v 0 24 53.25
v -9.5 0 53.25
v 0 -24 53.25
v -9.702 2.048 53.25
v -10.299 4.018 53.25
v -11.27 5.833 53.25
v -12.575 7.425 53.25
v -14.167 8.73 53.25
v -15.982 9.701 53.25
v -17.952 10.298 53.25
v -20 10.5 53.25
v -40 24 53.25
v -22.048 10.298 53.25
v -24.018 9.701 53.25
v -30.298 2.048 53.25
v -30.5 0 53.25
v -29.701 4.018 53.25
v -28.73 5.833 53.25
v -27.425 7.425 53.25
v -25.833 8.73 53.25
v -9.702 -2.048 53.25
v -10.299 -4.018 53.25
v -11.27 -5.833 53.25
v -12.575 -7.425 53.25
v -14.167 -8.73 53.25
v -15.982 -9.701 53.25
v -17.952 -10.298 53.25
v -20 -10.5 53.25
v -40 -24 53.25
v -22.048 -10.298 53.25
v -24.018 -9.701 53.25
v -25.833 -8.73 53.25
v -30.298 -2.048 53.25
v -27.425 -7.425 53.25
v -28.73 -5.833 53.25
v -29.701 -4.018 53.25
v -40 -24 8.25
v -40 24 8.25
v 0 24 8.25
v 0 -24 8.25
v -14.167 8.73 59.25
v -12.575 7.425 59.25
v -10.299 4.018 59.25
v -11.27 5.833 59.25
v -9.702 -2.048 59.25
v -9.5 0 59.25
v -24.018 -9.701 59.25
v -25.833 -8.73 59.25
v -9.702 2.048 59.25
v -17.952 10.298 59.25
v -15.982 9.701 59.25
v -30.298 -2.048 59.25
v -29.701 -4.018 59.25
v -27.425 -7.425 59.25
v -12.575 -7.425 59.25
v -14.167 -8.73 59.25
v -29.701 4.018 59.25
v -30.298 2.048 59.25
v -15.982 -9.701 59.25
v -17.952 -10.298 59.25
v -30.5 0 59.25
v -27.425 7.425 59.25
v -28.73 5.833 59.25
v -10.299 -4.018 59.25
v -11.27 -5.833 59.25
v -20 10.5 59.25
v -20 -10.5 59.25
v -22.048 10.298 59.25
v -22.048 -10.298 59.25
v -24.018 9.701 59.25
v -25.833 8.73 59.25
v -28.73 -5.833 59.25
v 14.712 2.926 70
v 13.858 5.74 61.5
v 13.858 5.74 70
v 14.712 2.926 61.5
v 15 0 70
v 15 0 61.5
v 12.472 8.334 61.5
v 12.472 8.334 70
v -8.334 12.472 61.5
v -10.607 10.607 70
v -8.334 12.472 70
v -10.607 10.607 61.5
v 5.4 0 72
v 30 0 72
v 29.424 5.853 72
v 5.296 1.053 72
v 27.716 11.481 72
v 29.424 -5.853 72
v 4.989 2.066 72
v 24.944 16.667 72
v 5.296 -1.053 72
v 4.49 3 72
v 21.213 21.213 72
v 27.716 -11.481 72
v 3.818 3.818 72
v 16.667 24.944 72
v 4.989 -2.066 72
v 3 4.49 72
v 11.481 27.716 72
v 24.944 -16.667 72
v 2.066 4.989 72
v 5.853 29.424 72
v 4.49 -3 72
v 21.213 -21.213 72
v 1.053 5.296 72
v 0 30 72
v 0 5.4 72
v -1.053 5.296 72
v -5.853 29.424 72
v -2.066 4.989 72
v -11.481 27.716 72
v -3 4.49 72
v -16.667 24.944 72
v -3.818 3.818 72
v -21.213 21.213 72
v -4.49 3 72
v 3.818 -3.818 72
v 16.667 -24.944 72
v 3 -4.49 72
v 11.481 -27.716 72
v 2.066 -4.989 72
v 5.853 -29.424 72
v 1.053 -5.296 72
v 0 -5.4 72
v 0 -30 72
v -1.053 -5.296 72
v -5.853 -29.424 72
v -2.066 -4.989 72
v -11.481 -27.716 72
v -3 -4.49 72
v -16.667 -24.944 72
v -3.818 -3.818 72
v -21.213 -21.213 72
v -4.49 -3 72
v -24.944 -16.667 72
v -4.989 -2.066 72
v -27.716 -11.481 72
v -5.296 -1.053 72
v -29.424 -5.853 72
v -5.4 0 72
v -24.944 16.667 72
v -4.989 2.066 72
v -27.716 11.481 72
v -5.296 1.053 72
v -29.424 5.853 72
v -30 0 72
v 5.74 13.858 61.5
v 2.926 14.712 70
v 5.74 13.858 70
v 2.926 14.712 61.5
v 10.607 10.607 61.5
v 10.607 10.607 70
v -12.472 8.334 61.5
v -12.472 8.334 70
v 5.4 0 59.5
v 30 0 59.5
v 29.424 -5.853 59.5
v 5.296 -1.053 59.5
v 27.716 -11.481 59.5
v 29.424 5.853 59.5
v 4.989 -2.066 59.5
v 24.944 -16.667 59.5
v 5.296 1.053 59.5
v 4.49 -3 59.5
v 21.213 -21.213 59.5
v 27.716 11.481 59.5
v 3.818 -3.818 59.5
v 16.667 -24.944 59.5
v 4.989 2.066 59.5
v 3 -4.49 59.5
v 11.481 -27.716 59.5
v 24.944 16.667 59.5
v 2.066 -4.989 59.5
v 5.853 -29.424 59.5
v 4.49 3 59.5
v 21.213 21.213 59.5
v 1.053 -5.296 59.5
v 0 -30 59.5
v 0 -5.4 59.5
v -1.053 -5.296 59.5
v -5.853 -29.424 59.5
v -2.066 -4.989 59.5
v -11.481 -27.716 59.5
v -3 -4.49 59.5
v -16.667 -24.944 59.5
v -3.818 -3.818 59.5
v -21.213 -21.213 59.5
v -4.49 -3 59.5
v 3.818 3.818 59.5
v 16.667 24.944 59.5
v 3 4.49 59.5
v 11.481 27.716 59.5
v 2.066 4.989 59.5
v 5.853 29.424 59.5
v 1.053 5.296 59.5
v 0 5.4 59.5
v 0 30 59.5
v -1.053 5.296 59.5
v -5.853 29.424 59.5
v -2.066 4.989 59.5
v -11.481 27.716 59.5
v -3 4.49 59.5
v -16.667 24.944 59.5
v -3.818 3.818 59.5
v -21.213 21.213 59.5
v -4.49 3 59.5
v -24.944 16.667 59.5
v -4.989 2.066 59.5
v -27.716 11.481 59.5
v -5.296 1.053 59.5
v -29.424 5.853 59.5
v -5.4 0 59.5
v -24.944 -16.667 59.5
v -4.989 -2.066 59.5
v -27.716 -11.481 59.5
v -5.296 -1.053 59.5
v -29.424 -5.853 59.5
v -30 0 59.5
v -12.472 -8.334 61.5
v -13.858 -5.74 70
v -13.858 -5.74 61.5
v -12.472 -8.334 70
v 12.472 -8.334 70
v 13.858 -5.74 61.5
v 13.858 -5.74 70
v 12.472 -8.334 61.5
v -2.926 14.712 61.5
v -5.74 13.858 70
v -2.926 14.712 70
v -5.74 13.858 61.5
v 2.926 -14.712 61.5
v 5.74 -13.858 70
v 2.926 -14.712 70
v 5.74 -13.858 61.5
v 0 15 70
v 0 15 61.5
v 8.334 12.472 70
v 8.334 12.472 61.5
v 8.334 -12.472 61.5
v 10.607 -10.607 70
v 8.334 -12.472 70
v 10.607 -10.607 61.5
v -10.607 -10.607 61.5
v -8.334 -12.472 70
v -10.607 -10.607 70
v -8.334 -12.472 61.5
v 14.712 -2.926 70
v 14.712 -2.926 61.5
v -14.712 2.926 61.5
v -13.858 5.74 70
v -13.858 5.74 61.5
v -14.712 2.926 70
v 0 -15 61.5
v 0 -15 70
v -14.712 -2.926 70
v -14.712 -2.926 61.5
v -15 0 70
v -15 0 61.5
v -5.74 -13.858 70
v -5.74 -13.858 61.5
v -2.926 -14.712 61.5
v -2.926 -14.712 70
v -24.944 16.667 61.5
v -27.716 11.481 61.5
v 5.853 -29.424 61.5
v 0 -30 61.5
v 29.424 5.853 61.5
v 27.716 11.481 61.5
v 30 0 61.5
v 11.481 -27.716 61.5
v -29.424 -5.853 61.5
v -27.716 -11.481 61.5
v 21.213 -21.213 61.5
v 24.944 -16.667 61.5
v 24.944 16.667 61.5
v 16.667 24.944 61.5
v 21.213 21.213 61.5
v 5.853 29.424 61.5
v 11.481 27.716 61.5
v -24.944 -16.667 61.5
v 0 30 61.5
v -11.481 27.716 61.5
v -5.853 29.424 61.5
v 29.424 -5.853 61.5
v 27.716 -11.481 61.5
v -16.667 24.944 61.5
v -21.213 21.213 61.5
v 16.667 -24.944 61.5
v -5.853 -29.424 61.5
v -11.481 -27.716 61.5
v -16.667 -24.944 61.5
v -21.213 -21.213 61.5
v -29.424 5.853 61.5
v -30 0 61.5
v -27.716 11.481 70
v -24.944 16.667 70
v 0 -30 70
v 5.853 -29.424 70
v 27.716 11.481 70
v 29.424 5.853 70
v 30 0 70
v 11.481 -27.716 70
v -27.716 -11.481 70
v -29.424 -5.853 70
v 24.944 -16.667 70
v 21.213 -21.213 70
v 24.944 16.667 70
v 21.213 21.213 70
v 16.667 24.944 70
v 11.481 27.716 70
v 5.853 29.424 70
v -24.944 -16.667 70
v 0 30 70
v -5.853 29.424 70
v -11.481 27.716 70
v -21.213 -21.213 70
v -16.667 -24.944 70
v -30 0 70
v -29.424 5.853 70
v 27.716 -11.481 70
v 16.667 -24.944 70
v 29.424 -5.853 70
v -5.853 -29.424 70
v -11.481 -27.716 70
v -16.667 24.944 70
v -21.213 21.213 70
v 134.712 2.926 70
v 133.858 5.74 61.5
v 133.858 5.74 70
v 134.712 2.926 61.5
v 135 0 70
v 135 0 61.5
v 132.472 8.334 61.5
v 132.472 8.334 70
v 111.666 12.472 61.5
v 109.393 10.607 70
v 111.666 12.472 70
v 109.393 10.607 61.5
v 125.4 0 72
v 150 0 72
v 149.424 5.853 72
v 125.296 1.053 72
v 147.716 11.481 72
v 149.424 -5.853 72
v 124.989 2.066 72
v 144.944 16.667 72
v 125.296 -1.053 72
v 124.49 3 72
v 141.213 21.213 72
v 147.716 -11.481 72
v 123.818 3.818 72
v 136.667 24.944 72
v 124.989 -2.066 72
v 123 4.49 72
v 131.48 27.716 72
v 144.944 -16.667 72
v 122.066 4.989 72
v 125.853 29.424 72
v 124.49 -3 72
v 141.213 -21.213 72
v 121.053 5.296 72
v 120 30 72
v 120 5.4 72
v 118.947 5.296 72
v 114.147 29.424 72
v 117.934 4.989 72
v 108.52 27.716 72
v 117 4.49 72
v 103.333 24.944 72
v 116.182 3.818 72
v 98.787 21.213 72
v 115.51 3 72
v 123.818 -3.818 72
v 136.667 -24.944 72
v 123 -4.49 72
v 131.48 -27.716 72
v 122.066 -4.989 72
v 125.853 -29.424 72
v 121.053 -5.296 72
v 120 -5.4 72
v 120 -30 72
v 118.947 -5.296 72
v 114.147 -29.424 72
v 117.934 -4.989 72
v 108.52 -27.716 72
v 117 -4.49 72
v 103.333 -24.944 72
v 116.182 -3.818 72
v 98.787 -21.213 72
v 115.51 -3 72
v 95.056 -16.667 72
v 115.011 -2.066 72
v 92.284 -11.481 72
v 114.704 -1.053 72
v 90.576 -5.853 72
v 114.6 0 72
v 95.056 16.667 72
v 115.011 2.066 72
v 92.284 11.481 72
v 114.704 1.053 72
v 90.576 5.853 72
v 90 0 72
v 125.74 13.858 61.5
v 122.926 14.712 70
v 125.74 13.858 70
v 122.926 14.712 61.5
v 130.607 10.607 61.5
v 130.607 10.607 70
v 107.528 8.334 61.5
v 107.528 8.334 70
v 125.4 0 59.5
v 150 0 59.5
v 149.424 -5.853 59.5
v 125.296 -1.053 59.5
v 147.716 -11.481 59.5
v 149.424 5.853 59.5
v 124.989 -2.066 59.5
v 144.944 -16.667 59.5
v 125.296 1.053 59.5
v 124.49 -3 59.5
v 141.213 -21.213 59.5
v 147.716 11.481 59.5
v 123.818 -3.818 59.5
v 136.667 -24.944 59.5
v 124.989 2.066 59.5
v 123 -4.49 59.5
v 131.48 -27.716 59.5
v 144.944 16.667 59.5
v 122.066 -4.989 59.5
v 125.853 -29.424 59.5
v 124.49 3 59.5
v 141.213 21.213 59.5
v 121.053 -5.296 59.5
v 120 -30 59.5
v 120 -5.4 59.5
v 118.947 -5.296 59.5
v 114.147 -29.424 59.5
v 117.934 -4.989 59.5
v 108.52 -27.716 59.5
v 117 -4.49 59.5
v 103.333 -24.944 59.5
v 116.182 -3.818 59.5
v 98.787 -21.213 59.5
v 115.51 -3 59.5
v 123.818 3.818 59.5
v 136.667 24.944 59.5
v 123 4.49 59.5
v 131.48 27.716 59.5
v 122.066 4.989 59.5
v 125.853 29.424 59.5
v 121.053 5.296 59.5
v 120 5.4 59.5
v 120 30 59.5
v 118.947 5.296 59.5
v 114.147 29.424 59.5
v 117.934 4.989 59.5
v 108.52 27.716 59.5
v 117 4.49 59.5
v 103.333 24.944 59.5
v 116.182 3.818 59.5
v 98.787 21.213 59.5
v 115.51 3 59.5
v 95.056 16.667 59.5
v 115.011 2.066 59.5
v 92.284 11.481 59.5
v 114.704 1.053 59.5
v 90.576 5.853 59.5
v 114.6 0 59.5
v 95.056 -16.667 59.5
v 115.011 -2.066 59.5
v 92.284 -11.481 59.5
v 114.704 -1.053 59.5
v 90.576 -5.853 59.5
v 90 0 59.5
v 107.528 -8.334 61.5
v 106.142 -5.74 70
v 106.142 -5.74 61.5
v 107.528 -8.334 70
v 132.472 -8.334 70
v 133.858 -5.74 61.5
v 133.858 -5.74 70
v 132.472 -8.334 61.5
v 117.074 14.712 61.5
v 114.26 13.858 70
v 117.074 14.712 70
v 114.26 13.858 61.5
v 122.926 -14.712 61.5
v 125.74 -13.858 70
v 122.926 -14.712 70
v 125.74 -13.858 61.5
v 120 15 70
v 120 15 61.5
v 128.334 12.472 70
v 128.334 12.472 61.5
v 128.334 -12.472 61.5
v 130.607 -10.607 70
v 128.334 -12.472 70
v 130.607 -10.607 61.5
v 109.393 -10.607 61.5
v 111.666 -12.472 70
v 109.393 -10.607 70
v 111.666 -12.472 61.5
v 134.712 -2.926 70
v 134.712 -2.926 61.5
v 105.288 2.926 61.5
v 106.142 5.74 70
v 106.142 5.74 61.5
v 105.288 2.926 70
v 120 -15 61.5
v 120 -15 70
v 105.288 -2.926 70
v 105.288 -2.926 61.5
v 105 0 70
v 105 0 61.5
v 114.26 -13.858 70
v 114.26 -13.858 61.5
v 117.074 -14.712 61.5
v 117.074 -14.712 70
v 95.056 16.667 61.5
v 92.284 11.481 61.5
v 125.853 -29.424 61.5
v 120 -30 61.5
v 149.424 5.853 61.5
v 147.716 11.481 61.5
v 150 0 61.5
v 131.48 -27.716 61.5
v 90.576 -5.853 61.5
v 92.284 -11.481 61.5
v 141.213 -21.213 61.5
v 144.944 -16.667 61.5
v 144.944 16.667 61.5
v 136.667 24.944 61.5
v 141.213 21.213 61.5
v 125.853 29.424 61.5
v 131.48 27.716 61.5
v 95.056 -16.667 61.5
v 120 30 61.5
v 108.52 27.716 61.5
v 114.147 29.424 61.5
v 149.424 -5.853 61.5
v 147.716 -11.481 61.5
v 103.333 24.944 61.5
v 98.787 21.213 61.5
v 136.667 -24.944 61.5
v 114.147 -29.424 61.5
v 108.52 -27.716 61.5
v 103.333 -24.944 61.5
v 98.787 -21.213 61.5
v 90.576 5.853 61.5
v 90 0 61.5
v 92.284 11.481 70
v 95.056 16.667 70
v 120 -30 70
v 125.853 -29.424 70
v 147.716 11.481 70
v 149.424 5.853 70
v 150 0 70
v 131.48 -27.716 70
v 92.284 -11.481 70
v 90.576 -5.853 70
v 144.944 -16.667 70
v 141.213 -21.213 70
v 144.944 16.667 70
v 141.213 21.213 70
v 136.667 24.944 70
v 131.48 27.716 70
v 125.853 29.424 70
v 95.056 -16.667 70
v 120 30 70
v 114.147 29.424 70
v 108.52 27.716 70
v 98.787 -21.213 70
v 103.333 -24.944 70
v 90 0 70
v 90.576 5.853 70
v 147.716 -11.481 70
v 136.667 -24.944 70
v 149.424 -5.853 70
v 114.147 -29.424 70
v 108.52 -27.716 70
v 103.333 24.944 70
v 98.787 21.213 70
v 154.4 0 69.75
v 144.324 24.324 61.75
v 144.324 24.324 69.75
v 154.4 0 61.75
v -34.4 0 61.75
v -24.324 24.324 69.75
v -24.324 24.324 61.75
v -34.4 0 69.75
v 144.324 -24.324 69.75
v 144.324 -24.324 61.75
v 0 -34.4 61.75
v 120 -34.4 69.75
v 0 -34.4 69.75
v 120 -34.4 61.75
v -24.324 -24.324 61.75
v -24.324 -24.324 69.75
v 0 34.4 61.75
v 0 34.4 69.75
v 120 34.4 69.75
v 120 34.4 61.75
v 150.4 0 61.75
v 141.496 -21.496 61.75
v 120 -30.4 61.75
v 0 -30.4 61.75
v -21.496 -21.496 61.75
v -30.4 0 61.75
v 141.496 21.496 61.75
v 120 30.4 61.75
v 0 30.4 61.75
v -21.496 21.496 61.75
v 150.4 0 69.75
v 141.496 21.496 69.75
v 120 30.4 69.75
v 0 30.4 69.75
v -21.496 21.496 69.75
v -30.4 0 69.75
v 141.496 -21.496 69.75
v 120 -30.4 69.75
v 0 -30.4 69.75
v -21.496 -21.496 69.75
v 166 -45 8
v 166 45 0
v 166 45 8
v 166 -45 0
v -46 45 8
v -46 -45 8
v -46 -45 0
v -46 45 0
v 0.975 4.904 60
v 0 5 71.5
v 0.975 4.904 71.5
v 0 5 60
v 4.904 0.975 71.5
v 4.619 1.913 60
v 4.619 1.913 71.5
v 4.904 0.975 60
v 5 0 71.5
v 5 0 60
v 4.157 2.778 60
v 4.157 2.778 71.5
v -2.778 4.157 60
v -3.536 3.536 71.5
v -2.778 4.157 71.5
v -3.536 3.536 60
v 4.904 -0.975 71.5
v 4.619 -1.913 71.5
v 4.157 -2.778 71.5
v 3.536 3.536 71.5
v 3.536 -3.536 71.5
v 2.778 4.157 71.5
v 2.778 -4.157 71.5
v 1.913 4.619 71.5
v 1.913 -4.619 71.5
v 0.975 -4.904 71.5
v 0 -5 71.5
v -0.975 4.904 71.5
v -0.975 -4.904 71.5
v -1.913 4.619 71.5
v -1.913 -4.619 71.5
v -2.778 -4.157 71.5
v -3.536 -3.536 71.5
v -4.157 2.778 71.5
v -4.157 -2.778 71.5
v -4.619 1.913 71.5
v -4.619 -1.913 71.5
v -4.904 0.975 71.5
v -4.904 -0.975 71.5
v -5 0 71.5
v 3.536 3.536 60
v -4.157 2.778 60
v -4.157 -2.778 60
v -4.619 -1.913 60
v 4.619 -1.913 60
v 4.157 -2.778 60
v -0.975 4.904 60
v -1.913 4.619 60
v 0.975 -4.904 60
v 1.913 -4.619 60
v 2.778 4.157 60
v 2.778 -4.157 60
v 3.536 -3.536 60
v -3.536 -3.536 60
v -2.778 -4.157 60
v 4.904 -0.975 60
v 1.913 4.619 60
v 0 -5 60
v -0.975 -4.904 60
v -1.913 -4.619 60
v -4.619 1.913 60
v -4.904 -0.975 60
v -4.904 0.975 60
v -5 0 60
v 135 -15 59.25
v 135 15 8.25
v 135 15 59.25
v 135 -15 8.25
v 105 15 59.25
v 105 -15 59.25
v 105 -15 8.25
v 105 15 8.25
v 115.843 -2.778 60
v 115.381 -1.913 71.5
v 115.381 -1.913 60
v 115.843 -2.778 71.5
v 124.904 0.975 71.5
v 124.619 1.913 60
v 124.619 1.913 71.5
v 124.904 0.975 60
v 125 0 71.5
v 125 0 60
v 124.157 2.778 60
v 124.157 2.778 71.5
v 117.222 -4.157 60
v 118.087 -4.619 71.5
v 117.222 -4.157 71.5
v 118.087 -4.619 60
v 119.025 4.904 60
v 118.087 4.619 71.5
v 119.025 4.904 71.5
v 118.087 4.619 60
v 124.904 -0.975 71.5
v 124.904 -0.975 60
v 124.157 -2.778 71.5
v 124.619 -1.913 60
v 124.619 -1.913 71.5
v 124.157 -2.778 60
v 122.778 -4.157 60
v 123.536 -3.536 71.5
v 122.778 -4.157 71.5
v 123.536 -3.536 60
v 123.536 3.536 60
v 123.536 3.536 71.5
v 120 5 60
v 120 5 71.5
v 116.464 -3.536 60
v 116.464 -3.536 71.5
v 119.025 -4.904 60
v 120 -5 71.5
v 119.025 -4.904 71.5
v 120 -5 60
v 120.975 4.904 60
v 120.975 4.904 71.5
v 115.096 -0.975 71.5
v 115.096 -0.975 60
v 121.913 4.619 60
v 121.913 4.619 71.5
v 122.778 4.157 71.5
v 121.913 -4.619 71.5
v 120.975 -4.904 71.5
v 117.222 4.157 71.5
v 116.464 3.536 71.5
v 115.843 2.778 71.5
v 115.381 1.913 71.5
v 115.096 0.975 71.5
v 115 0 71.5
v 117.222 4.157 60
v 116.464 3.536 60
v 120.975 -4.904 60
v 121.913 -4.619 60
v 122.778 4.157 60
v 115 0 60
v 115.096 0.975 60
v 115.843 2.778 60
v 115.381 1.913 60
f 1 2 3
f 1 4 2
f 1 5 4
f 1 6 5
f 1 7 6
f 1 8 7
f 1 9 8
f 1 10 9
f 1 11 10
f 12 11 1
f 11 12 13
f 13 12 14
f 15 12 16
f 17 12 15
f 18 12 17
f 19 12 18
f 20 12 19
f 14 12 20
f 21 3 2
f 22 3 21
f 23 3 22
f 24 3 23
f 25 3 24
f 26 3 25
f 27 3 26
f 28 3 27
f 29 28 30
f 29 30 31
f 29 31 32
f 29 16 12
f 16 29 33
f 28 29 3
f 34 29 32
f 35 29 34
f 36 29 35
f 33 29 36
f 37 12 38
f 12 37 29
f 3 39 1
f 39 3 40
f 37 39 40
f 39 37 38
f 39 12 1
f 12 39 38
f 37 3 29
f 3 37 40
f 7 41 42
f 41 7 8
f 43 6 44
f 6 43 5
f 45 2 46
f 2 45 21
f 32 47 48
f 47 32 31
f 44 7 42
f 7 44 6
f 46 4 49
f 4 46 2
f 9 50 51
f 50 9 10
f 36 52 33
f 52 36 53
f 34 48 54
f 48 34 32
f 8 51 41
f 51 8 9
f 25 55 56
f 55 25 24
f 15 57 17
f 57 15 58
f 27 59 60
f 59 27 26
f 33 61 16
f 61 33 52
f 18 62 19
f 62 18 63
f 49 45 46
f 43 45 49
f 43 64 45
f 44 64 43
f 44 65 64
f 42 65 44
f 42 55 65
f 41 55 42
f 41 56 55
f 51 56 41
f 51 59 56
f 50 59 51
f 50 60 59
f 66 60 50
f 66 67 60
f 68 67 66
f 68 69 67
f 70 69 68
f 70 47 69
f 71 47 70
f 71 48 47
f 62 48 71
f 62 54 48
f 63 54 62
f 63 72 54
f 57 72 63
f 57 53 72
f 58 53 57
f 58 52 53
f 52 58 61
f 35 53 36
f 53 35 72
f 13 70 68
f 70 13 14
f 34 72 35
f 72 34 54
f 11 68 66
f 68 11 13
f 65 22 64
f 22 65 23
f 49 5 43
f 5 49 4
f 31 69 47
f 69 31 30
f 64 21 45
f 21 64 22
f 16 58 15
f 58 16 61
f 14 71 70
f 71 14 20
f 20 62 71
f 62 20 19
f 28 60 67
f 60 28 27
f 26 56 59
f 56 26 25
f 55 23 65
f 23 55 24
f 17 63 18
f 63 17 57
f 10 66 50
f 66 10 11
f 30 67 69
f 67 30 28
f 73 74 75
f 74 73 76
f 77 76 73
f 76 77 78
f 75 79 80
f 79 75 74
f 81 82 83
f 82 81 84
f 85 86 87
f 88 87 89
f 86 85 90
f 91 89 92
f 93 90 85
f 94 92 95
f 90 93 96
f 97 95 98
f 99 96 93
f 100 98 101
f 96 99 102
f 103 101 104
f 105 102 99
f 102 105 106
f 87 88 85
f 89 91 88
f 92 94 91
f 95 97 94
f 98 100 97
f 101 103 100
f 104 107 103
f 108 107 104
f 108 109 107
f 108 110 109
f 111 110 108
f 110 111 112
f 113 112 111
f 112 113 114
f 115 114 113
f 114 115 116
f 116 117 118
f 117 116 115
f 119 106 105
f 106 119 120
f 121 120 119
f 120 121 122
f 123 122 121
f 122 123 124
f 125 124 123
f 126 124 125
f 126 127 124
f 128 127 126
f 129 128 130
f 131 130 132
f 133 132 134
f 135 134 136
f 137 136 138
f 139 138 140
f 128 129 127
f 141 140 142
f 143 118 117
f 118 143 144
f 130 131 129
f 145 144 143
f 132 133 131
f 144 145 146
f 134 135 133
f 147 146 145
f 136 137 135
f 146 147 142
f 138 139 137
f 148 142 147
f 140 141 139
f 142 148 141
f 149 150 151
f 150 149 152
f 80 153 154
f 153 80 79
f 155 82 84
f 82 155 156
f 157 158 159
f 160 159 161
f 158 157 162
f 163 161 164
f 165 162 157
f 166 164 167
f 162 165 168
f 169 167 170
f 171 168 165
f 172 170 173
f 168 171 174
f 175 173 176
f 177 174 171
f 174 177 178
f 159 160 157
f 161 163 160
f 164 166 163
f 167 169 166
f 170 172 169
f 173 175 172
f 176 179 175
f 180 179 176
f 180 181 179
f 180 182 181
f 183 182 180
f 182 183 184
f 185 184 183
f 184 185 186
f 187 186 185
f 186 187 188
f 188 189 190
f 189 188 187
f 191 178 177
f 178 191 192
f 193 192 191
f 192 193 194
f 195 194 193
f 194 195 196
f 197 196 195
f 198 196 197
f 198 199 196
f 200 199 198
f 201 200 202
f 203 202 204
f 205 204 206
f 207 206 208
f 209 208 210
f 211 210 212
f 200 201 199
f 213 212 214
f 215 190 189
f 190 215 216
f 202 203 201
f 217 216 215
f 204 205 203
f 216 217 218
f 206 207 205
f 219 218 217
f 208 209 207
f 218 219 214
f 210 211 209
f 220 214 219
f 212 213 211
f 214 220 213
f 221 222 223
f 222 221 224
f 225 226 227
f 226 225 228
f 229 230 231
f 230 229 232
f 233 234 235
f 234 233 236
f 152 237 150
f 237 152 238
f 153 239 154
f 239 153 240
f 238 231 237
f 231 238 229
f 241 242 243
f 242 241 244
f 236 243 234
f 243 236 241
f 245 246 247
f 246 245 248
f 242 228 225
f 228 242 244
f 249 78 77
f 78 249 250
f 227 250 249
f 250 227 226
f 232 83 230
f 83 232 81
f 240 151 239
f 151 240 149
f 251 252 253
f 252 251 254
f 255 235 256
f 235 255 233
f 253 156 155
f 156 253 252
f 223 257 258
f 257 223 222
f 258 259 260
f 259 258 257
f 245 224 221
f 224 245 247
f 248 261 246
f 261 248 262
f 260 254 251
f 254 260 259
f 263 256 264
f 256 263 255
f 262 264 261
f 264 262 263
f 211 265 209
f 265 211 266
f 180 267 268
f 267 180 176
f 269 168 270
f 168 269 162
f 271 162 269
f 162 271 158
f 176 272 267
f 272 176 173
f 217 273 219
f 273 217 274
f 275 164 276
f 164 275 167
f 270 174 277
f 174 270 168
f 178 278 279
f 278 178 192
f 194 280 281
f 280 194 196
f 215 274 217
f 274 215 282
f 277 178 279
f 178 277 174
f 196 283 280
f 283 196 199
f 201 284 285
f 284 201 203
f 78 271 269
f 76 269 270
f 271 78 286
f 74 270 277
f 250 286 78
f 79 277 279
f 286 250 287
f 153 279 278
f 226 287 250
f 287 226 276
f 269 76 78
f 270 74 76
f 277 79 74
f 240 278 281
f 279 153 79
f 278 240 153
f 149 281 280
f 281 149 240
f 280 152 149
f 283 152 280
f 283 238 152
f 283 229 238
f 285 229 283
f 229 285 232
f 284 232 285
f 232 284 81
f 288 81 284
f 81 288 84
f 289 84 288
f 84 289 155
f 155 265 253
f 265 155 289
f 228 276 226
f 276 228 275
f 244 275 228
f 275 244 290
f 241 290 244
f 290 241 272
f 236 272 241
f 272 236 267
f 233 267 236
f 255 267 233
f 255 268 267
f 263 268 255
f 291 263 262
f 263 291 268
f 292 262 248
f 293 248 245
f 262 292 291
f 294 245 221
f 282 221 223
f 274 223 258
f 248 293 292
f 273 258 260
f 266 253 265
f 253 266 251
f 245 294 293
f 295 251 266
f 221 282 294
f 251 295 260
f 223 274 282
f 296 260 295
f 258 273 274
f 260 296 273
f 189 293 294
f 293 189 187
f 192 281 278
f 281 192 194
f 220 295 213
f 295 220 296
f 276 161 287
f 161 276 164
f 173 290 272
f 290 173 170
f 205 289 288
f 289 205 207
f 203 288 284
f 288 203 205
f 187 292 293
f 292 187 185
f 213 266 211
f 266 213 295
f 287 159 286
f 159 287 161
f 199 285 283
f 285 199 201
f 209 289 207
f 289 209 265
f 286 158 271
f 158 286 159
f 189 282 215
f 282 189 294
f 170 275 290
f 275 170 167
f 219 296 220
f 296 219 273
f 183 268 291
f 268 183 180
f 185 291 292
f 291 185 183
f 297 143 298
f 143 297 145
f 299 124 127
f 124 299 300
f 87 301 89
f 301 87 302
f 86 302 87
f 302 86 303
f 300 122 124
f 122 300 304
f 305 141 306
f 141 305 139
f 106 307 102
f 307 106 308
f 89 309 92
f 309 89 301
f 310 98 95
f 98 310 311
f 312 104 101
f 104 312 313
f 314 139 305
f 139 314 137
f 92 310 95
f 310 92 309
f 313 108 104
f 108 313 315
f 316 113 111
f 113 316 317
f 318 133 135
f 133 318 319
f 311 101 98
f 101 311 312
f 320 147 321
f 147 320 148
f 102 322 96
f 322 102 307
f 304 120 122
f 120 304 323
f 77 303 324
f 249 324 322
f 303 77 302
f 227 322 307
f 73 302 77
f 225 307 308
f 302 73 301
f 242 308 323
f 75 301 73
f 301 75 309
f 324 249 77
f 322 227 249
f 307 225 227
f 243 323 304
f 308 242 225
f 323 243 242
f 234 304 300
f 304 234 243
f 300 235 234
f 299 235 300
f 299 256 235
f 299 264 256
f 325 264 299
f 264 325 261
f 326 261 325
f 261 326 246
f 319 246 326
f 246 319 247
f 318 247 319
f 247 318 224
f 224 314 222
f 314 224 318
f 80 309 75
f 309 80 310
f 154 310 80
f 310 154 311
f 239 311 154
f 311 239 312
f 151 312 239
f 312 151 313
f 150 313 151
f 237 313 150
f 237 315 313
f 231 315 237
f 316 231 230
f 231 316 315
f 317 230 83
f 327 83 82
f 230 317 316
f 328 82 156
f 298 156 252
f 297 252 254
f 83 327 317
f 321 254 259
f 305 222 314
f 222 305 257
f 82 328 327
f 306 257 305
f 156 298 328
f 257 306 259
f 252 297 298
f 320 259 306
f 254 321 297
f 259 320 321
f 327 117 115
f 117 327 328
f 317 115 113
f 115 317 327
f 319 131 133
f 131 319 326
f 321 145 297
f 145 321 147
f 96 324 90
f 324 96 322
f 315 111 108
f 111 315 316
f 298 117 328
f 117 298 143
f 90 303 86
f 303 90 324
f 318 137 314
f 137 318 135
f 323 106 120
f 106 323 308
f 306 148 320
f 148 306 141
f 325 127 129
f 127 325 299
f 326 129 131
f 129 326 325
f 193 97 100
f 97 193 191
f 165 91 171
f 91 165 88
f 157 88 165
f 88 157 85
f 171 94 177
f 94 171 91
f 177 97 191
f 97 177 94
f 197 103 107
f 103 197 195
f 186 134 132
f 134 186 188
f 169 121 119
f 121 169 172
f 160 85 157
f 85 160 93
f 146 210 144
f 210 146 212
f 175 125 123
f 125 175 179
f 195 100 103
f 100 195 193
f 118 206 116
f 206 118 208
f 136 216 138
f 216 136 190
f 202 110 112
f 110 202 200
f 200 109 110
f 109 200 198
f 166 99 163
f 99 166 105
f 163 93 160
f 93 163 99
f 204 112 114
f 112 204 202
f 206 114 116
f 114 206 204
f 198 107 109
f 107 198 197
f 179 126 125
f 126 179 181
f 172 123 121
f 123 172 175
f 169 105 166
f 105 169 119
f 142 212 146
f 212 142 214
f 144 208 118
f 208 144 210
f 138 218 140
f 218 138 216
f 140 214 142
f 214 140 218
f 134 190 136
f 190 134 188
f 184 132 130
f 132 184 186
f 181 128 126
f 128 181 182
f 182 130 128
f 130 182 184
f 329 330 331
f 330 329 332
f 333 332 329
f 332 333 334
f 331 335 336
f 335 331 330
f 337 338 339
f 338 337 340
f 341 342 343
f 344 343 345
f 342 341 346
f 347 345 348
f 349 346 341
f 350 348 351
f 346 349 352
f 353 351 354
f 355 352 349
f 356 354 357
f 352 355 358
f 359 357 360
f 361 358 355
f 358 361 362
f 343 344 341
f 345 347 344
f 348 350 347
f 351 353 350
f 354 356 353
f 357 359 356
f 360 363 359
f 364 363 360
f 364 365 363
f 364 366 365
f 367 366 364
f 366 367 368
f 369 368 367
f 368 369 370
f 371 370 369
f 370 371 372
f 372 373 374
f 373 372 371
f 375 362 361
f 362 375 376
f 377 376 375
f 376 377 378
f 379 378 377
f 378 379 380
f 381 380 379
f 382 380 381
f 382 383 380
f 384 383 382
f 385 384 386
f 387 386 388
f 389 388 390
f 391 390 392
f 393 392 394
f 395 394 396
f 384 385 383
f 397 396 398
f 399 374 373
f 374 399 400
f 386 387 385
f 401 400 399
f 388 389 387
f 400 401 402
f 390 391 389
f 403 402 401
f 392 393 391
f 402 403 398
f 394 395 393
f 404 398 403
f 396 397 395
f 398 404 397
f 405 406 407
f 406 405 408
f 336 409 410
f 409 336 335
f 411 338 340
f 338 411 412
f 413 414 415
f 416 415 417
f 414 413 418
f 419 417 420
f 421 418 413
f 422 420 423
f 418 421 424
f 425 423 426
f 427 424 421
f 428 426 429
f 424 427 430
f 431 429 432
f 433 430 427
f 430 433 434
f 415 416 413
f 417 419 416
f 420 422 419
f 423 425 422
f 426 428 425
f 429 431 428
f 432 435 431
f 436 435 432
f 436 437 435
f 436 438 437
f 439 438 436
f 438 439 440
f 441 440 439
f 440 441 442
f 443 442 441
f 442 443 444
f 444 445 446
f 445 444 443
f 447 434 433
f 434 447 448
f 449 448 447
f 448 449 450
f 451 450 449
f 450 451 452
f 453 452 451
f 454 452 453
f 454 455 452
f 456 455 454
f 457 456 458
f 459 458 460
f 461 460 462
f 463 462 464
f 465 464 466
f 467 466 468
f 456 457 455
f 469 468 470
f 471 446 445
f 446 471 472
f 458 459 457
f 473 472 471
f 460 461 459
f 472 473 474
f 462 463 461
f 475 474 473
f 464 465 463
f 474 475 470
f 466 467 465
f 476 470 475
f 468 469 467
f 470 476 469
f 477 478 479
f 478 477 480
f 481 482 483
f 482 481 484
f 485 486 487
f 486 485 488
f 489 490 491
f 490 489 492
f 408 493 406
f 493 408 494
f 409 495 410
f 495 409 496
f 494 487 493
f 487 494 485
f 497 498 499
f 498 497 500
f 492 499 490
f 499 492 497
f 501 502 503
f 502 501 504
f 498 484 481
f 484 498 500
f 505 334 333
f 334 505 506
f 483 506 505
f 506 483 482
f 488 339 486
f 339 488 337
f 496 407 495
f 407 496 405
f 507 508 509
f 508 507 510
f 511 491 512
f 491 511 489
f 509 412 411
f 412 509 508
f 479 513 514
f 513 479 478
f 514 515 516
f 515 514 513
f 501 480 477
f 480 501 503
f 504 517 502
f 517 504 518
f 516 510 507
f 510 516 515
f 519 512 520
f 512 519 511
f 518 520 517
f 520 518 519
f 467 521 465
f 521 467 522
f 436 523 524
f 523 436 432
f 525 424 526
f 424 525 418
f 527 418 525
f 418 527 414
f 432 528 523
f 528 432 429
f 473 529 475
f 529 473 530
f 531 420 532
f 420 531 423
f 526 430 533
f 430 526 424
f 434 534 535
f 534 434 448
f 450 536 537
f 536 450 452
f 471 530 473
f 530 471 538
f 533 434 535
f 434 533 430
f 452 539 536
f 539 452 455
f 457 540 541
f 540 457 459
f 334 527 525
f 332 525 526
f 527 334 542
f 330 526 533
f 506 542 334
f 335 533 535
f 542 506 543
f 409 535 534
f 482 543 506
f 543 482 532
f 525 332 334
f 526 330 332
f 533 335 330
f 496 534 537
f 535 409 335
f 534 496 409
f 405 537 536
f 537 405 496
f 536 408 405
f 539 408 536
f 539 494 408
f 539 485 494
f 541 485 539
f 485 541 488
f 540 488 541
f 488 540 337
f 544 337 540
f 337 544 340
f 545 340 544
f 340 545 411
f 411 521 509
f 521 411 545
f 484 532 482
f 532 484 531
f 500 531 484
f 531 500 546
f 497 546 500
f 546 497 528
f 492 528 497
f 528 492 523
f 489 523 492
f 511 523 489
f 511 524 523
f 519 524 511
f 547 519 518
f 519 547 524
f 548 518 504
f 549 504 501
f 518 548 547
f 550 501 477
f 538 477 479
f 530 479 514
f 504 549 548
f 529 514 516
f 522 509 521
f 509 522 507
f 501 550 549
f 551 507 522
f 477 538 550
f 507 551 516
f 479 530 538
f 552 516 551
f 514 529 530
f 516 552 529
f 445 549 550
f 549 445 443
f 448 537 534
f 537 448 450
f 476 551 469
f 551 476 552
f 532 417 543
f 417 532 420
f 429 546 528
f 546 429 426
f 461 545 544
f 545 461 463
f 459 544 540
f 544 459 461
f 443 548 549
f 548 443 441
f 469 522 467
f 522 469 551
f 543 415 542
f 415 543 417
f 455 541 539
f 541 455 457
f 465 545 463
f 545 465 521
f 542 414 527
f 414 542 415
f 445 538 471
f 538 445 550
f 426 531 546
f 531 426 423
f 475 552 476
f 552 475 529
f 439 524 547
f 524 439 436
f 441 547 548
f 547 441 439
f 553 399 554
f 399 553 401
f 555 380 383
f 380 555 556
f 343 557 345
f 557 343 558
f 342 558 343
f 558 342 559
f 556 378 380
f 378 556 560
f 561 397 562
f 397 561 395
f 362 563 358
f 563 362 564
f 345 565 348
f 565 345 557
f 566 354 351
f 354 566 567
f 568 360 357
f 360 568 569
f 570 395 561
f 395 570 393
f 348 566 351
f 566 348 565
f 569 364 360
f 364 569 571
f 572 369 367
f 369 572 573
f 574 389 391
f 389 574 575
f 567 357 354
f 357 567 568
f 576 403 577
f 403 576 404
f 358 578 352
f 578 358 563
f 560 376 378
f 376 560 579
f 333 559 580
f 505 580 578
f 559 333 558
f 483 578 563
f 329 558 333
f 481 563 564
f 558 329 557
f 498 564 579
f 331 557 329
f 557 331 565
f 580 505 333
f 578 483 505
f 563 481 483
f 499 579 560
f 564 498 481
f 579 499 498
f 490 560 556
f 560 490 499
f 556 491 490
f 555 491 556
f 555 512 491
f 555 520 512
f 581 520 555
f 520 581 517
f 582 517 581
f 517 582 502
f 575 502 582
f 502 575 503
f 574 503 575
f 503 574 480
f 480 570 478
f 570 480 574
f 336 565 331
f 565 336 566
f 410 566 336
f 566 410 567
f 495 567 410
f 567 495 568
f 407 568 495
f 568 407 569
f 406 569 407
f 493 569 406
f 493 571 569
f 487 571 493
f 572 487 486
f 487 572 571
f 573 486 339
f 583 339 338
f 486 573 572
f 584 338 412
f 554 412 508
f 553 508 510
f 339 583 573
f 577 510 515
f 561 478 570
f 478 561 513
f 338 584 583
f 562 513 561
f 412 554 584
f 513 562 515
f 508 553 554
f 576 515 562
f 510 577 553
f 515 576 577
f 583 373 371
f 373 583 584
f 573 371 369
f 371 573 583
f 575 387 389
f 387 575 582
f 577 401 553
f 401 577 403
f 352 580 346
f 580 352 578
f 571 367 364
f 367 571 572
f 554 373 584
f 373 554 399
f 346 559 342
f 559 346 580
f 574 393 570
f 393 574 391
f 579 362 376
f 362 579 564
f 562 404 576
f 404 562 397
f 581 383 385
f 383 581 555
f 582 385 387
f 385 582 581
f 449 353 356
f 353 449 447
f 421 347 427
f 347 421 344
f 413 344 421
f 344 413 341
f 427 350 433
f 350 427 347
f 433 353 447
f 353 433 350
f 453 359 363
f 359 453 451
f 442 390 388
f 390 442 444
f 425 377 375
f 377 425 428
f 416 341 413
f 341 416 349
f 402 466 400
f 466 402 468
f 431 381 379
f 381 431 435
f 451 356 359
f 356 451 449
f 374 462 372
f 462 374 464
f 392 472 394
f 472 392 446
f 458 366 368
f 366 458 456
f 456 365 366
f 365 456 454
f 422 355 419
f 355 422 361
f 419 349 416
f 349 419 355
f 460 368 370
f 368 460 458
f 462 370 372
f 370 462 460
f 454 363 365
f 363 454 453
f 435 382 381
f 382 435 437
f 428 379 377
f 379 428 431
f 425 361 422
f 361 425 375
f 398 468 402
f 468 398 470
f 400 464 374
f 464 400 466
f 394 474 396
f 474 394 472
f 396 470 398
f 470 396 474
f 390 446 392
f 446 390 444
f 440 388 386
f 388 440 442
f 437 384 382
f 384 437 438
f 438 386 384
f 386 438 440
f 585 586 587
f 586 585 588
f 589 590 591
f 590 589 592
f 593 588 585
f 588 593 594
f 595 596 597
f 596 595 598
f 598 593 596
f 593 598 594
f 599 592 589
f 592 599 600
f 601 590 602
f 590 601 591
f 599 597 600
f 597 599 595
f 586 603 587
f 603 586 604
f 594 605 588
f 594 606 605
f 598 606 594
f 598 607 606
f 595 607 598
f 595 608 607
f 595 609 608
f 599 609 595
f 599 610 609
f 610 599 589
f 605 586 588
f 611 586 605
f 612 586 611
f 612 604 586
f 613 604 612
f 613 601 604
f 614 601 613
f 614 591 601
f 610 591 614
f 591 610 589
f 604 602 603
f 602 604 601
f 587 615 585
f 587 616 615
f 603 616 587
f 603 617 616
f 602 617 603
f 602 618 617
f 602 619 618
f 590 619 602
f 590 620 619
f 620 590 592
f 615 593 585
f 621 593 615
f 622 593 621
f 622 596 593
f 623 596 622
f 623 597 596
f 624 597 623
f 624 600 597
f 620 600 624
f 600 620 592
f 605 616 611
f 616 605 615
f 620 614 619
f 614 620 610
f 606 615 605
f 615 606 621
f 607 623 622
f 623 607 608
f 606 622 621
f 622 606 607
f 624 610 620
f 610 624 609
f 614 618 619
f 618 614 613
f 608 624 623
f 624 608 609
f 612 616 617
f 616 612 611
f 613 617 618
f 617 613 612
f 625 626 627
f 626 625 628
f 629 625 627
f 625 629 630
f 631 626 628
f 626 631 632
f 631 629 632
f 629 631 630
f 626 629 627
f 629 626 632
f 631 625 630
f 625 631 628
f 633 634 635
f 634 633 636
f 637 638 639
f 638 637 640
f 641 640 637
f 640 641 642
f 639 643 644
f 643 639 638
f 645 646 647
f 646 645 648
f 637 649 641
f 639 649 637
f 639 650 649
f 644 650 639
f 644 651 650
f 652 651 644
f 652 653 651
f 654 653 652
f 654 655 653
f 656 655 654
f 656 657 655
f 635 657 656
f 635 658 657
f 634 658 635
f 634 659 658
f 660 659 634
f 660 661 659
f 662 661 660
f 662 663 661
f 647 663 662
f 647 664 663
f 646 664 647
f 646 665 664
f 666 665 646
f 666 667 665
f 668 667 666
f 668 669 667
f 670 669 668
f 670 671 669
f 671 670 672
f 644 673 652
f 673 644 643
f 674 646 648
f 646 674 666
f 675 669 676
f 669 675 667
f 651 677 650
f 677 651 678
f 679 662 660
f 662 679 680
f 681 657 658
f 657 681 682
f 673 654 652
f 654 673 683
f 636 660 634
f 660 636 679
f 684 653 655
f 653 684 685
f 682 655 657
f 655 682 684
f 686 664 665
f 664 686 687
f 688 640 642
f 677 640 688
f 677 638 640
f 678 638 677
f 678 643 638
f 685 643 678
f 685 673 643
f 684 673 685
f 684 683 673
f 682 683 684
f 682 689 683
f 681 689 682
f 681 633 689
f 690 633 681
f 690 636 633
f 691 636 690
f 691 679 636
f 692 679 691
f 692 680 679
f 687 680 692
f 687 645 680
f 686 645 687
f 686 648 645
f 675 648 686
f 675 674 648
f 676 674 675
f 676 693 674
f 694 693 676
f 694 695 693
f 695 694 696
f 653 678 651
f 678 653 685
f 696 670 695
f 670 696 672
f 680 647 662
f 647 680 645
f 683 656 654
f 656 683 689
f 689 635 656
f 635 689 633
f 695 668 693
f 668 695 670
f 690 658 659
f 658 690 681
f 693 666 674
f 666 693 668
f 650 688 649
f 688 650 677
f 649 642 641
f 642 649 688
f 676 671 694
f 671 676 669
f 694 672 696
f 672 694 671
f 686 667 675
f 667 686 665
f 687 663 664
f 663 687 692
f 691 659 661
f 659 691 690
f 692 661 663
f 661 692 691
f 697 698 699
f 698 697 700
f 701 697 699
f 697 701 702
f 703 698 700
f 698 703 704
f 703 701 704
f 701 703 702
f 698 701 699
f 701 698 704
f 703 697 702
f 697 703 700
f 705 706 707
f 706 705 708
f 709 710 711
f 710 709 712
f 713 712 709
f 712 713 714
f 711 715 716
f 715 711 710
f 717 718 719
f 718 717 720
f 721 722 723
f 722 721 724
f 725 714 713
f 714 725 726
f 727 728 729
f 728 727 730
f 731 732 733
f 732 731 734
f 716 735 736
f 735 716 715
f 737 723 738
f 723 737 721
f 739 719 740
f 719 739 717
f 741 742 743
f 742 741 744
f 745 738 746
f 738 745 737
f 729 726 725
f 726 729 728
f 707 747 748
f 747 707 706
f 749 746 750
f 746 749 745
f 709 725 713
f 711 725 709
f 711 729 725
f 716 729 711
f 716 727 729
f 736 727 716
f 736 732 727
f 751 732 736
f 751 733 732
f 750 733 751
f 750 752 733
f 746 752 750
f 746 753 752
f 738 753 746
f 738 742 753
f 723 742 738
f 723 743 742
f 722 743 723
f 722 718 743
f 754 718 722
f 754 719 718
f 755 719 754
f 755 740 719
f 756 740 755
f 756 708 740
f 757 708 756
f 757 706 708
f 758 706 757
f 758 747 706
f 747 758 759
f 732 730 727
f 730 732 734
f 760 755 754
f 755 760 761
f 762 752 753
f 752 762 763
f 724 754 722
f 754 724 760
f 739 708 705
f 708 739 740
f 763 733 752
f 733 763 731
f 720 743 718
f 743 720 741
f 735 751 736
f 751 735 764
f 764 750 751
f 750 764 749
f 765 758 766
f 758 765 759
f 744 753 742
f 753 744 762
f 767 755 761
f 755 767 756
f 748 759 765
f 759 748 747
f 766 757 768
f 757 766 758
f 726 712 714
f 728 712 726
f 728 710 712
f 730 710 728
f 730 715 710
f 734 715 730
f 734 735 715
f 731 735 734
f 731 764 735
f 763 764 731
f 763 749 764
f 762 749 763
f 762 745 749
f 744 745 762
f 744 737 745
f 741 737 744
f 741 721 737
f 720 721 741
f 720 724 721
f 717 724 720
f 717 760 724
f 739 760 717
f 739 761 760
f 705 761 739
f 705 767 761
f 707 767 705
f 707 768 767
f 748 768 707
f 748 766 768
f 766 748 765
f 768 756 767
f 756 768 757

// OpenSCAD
$fn = 32;

// ------------------------------------------------------------------------
// Motor belt drive: span 120 mm, pulleys d60, belt 8 mm wide
// Every part is its own module, assembly() places every instance.
// ------------------------------------------------------------------------

// --- part 1 ---
module base_plate() {
  difference() {
    translate([-106, -45, 0]) cube([212, 90, 8]);
  }
}

// --- part 2 ---
module motor() {
  union() {
    translate([-22.5, -24, 0]) cube([45, 48, 40]);
    translate([25.5, 0, 20]) rotate([0, 90, 0]) cylinder(h = 6, d = 21, center = true);
  }
}

// --- part 3 ---
module drive_shaft() {
  translate([0, 0, -5.75]) cylinder(h = 11.5, d = 10);
}

// --- part 4 ---
module pulley_drive() {
  difference() {
    union() {
      cylinder(h = 12.5, d = 30);
      cylinder(h = 2, d = 60);
      translate([0, 0, 10.5]) cylinder(h = 2, d = 60);
    }
    translate([0, 0, -1]) cylinder(h = 14.5, d = 10.8);
  }
}

// --- part 5 ---
module idler_post() {
  translate([-15, -15, 0]) cube([30, 30, 51]);
}

// --- part 6 ---
module driven_shaft() {
  translate([0, 0, -5.75]) cylinder(h = 11.5, d = 10);
}

// --- part 7 ---
module pulley_driven() {
  difference() {
    union() {
      cylinder(h = 12.5, d = 30);
      cylinder(h = 2, d = 60);
      translate([0, 0, 10.5]) cylinder(h = 2, d = 60);
    }
    translate([0, 0, -1]) cylinder(h = 14.5, d = 10.8);
  }
}

// --- part 8 ---
module drive_belt() {
  difference() {
    linear_extrude(height = 8) polygon(points = concat([for (a = [90 : 45 : 270]) [34.4 * cos(a), 34.4 * sin(a)]], [for (a = [270 : 45 : 450]) [120 + 34.4 * cos(a), 34.4 * sin(a)]]));
    translate([0, 0, -1]) linear_extrude(height = 10) polygon(points = concat([for (a = [90 : 45 : 270]) [30.4 * cos(a), 30.4 * sin(a)]], [for (a = [270 : 45 : 450]) [120 + 30.4 * cos(a), 30.4 * sin(a)]]));
  }
}

// --- assembly ---
module assembly() {
  color([0.80, 0.24, 0.20]) translate([60, 0, 0]) rotate([0, 0, 0]) base_plate();
  color([0.20, 0.45, 0.75]) translate([0, 0, 30.75]) rotate([0, 270, 0]) motor();
  color([0.25, 0.62, 0.32]) translate([0, 0, 65.75]) rotate([0, 0, 0]) drive_shaft();
  color([0.92, 0.70, 0.18]) translate([0, 0, 59.5]) rotate([0, 0, 0]) pulley_drive();
  color([0.58, 0.35, 0.70]) translate([120, 0, 8.25]) rotate([0, 0, 0]) idler_post();
  color([0.16, 0.66, 0.66]) translate([120, 0, 65.75]) rotate([0, 0, 0]) driven_shaft();
  color([0.85, 0.48, 0.18]) translate([120, 0, 59.5]) rotate([0, 0, 0]) pulley_driven();
  color([0.55, 0.60, 0.65]) translate([0, 0, 61.75]) rotate([0, 0, 0]) drive_belt();
}

assembly();
